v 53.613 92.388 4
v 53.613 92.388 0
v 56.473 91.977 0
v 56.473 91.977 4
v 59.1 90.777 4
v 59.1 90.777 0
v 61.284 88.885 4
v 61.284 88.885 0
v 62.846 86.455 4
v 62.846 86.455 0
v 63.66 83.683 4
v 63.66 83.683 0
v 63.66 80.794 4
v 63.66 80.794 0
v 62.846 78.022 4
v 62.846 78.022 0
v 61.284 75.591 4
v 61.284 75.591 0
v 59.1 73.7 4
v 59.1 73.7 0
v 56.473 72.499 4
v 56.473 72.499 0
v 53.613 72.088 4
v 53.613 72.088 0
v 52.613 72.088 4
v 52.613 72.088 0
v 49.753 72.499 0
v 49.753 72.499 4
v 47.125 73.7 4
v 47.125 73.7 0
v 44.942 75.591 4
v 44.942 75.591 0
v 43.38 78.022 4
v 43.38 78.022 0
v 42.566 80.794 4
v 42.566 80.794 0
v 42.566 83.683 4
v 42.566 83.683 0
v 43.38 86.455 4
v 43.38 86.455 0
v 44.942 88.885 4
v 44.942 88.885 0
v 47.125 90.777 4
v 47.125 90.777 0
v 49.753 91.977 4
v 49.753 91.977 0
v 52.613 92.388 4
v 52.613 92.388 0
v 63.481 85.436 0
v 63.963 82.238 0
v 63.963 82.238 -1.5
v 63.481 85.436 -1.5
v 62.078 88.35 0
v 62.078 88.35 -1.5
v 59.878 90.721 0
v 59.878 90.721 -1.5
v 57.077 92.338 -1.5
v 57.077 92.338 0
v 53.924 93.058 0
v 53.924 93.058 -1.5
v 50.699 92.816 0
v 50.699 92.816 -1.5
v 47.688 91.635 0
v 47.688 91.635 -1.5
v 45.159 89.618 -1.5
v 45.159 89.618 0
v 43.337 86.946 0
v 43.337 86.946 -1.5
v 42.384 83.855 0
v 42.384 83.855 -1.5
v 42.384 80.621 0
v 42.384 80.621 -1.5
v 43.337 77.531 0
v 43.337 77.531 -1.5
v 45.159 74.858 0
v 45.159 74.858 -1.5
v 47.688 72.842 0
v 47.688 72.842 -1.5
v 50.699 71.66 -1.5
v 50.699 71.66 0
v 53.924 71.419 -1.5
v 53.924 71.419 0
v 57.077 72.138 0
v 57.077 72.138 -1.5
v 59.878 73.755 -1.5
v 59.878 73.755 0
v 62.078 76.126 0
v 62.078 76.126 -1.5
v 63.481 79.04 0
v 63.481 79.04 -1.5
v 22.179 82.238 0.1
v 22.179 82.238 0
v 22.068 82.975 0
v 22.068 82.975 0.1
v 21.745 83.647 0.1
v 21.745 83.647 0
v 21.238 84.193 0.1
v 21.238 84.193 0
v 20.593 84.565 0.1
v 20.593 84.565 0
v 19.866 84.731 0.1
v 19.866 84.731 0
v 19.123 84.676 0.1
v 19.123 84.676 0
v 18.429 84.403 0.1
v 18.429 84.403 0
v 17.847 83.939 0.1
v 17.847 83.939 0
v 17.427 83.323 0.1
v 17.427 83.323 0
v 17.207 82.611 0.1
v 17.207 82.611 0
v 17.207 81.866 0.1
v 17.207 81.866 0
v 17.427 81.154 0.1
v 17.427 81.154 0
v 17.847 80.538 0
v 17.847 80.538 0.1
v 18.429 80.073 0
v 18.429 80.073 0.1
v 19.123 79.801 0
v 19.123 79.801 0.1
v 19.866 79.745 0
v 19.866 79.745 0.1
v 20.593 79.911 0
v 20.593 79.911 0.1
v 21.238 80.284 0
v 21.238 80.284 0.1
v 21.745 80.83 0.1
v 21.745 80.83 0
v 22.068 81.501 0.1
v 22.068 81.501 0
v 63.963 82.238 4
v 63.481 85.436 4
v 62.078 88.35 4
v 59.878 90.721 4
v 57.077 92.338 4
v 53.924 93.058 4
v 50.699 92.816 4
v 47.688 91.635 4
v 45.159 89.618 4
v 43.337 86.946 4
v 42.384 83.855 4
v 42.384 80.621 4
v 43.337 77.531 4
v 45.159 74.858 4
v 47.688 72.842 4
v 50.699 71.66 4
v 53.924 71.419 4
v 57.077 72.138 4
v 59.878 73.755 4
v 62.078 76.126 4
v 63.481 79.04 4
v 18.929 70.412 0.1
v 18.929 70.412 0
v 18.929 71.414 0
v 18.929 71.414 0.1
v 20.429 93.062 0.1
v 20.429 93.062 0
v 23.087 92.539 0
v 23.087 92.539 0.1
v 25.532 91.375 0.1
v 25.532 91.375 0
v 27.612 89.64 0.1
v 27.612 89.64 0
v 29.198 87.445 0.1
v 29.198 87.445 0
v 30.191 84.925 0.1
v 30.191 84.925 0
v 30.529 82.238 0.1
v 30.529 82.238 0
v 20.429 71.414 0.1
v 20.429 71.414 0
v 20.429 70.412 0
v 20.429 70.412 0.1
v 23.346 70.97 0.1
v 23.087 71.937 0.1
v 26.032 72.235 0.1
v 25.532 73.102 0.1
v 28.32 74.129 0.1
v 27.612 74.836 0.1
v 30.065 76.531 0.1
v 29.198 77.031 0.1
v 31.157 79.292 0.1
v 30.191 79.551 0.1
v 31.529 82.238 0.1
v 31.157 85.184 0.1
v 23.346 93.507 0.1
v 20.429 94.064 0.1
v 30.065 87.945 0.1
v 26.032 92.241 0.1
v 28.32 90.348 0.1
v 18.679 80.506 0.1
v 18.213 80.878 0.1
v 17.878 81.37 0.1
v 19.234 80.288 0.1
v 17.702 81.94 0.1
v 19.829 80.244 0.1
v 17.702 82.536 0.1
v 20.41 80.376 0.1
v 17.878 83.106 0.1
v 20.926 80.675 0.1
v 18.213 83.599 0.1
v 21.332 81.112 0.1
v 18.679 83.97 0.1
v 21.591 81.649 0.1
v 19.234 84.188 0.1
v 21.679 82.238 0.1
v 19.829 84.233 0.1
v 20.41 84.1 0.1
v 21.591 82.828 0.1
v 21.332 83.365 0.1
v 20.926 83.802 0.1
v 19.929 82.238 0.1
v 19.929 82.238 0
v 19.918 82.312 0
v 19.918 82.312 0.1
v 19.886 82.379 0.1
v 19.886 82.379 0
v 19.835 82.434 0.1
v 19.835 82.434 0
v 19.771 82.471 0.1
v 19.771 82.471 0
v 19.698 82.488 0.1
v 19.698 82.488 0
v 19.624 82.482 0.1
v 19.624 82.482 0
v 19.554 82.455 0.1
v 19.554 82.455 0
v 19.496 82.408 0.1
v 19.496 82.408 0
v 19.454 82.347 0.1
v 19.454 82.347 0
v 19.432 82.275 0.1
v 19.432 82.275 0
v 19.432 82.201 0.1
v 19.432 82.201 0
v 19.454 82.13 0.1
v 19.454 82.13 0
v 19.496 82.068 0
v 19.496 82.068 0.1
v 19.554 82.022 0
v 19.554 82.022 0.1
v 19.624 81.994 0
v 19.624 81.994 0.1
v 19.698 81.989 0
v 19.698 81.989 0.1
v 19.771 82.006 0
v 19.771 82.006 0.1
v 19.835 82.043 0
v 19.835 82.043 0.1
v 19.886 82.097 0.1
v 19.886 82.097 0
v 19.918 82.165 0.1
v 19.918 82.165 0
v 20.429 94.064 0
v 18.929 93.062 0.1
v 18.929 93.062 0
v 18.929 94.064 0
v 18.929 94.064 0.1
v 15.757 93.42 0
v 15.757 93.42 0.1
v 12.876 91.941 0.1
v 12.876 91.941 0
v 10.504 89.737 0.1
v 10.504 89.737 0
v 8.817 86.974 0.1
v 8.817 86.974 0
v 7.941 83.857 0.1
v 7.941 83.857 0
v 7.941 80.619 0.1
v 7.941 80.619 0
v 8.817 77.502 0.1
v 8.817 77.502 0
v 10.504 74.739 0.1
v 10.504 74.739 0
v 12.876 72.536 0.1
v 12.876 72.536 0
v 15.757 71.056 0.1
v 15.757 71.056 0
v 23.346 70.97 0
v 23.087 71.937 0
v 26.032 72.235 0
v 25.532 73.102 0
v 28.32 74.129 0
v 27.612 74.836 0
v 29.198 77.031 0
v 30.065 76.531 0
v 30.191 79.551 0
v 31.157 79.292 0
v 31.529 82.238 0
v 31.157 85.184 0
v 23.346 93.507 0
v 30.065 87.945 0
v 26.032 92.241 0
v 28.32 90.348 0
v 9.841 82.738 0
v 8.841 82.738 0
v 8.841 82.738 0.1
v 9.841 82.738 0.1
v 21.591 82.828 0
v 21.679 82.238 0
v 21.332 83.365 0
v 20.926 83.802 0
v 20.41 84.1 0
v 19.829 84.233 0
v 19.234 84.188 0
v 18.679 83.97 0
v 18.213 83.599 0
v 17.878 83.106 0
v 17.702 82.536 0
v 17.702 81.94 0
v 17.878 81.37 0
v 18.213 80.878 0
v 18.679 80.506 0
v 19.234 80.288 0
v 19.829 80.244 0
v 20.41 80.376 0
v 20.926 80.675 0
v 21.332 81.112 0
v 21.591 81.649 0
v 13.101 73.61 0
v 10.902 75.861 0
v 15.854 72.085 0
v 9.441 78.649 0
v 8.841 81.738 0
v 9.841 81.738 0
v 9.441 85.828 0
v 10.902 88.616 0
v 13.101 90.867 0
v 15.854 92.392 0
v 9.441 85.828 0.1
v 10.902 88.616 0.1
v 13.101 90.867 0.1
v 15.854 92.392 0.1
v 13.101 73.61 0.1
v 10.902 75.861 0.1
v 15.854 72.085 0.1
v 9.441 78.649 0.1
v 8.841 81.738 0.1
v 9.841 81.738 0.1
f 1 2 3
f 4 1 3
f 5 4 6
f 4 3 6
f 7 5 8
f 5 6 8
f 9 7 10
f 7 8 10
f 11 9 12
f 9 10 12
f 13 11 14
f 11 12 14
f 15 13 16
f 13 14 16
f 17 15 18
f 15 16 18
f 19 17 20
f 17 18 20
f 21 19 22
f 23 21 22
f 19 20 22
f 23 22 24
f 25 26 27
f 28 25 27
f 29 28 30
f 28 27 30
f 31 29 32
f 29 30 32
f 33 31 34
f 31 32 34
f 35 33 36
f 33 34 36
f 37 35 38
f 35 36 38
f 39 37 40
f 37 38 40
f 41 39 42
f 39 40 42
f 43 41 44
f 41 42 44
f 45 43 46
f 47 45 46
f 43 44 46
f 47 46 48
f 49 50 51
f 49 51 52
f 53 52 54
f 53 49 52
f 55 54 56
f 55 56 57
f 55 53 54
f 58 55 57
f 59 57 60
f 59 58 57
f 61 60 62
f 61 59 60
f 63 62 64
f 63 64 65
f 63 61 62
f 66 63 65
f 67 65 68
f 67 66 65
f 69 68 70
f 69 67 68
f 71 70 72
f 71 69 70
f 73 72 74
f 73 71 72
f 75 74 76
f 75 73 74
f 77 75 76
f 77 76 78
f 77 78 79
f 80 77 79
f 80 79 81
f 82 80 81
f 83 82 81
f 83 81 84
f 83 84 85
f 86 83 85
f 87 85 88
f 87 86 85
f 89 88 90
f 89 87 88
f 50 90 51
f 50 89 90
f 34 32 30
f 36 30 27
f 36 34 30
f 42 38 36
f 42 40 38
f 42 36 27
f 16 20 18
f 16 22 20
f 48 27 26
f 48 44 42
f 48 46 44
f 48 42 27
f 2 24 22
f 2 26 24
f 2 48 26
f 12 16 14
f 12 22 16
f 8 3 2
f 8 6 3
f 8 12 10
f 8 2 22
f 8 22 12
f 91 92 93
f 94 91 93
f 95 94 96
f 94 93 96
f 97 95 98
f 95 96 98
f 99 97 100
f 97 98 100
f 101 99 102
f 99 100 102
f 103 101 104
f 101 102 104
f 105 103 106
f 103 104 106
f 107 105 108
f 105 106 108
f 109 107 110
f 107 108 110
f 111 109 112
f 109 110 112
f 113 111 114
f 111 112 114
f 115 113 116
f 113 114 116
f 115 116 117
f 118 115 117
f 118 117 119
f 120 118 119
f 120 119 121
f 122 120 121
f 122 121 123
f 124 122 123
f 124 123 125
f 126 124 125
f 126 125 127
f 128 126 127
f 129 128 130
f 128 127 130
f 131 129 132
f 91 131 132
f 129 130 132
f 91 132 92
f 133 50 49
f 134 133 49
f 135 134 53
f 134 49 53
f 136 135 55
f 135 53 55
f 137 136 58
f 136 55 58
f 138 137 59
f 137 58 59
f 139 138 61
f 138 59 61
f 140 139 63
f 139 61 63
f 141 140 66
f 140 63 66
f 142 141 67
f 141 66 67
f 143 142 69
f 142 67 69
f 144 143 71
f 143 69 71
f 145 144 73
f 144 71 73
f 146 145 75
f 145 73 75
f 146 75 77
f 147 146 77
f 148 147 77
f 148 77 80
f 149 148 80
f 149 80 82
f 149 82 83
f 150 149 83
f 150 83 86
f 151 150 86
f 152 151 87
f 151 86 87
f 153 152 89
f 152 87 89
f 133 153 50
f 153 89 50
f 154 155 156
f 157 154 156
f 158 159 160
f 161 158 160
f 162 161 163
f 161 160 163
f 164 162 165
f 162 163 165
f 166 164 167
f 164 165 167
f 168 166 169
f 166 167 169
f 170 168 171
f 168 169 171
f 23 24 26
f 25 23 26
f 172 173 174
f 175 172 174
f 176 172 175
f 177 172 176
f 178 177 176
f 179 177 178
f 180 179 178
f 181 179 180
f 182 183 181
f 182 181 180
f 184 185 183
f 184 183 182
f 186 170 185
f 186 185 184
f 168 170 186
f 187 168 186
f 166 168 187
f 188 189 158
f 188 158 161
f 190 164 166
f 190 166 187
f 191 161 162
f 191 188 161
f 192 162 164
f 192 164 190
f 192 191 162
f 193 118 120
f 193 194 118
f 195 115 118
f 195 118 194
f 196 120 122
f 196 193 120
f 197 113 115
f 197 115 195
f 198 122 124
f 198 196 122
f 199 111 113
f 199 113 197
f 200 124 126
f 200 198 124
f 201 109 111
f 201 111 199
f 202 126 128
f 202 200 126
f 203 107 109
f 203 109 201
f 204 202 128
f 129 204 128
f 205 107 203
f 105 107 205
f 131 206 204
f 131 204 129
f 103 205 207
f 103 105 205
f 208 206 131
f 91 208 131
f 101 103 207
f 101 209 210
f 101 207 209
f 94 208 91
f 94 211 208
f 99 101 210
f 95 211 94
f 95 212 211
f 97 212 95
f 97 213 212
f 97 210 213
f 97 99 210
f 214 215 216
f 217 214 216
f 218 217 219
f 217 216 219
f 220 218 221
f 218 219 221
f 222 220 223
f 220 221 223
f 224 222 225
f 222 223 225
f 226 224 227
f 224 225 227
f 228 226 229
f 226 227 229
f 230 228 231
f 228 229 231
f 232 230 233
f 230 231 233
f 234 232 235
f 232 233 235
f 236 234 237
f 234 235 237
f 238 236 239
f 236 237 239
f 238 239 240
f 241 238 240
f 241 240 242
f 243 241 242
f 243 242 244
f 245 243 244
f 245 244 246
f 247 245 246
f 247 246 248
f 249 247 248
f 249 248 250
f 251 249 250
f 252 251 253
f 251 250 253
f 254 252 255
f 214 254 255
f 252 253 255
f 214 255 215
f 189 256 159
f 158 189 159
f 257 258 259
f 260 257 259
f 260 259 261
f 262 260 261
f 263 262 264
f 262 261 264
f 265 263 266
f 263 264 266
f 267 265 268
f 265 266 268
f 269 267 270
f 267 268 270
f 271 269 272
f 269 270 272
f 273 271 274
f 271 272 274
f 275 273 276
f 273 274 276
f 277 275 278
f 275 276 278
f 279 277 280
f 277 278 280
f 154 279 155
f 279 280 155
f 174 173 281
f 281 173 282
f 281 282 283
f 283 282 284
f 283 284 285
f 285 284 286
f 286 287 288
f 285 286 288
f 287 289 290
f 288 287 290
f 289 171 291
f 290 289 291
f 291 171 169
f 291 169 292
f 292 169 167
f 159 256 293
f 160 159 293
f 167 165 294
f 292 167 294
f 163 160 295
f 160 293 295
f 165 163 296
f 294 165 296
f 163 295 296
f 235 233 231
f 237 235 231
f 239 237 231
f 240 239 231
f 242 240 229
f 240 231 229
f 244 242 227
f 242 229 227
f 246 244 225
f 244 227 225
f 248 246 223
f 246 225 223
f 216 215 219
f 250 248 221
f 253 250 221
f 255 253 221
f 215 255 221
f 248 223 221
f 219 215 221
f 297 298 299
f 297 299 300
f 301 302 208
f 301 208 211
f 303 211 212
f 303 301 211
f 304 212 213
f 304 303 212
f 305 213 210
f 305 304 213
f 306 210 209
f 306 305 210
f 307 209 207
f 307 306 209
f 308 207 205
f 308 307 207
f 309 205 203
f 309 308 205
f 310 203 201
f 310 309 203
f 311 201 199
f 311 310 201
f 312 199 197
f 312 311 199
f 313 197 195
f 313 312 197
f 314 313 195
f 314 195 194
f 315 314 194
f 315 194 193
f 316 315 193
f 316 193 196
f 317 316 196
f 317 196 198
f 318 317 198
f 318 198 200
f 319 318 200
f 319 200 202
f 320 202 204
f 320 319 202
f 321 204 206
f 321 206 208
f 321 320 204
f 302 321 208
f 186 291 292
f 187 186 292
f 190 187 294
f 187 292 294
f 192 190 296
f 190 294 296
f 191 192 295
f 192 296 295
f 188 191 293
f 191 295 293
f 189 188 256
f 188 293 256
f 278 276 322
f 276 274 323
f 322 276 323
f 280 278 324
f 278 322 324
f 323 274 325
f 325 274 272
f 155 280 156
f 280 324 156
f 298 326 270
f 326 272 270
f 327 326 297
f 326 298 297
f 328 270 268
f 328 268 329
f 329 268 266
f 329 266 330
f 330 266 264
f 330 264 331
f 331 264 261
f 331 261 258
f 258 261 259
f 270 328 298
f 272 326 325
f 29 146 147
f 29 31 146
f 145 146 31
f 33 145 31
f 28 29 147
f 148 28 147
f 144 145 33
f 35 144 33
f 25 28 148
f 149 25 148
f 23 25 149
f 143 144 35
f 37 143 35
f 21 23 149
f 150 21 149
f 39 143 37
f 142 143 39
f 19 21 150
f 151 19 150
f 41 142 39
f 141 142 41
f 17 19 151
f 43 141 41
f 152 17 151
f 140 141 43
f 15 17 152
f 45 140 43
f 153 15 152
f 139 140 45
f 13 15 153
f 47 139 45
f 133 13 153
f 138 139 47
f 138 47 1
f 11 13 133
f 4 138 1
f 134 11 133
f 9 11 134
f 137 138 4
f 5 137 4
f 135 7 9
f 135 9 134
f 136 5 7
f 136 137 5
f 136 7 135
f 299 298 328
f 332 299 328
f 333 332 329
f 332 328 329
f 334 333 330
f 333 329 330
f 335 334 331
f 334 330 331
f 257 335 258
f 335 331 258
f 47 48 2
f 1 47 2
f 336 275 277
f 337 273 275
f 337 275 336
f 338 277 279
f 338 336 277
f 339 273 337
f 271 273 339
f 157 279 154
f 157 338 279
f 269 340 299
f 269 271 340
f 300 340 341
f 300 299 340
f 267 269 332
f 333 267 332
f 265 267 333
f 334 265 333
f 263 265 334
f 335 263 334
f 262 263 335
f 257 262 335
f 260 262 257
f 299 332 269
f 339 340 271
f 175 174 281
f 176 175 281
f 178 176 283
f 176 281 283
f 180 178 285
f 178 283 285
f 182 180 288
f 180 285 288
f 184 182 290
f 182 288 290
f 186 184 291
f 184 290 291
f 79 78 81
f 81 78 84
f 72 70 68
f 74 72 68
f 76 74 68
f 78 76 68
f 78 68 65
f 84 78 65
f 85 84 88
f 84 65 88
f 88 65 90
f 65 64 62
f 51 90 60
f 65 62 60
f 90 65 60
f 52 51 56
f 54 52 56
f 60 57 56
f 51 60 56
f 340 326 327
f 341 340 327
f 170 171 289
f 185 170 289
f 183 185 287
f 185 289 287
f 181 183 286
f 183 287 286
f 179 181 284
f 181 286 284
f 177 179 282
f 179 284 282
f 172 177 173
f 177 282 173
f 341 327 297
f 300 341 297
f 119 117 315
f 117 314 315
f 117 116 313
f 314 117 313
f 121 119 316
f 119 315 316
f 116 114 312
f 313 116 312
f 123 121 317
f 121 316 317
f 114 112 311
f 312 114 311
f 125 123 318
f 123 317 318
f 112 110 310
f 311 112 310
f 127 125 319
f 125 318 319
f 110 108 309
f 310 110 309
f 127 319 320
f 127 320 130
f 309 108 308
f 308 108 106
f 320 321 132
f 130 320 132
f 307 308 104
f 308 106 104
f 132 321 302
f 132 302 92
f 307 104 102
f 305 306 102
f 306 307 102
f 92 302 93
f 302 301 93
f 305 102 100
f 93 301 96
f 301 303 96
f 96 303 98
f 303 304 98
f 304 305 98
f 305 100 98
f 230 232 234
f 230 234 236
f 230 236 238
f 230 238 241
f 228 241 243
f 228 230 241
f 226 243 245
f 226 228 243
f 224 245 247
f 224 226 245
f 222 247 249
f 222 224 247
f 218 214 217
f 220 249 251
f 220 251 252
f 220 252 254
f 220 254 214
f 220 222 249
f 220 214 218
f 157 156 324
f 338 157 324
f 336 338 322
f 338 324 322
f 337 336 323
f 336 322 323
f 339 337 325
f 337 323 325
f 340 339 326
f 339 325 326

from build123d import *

# Parameters (mm, degrees)
F0_R     = 2.5
F0_R_2   = 2
F1_DEPTH = 0.1
F0_W     = 1
F0_H     = 1
F2_DEPTH = 0.1
F0_R_3   = 0.25
F3_DEPTH = 0.1
F0_R_4   = 10.85
F4_DEPTH = 1.5
F5_DEPTH = 4


with BuildPart() as f1:
    # F0 (on Top) → F1 (new body)
    with BuildSketch(Plane.XY):
        with Locations((19.679473713, 82.238227129)):
            Circle(F0_R)
        with Locations((19.679473713, 82.238227129)):
            Circle(F0_R_2, mode=Mode.SUBTRACT)
    extrude(amount=F1_DEPTH)


with BuildPart() as f2:
    # F0 (on Top) → F2 (new body)
    with BuildSketch(Plane.XY):
        with BuildLine():
            ThreePointArc((8.8410005733, 81.738227129), (8.829473713, 82.238227129), (8.8410005733, 82.738227129))
            ThreePointArc((8.8410005733, 82.738227129), (11.9193406213, 89.8212894654), (18.929473713, 93.0622744312))
            Line((18.929473713, 93.0622744312), (18.929473713, 94.0644691356))
            ThreePointArc((18.929473713, 94.0644691356), (7.829473713, 82.238227129), (18.929473713, 70.4119851223))
            Line((18.929473713, 70.4119851223), (18.929473713, 71.4141798268))
            ThreePointArc((18.929473713, 71.4141798268), (11.9193406213, 74.6551647926), (8.8410005733, 81.738227129))
        make_face()
        with Locations((9.3410005733, 82.238227129)):
            Rectangle(F0_W, F0_H)
        with BuildLine():
            Line((8.8410005733, 81.738227129), (8.8410005733, 82.738227129))
            ThreePointArc((8.8410005733, 82.738227129), (8.829473713, 82.238227129), (8.8410005733, 81.738227129))
        make_face()
    extrude(amount=F2_DEPTH)


with BuildPart() as f2b:
    # F0 (on Top) → F2, piece 2 (new body)
    with BuildSketch(Plane.XY):
        with BuildLine():
            Line((20.429473713, 94.0644691356), (20.429473713, 93.0622744312))
            ThreePointArc((20.429473713, 93.0622744312), (27.6123168351, 89.6404227492), (30.529473713, 82.238227129))
            ThreePointArc((30.529473713, 82.238227129), (27.6123168351, 74.8360315088), (20.429473713, 71.4141798268))
            Line((20.429473713, 71.4141798268), (20.429473713, 70.4119851223))
            ThreePointArc((20.429473713, 70.4119851223), (28.3197862074, 74.1285107344), (31.529473713, 82.238227129))
            ThreePointArc((31.529473713, 82.238227129), (28.3197862074, 90.3479435235), (20.429473713, 94.0644691356))
        make_face()
    extrude(amount=F2_DEPTH)


with BuildPart() as f3:
    # F0 (on Top) → F3 (new body)
    with BuildSketch(Plane.XY):
        with Locations((19.679473713, 82.238227129)):
            Circle(F0_R_3)
    extrude(amount=F3_DEPTH)


with BuildPart() as f4:
    # F0 (on Top) → F4 (new body)
    with BuildSketch(Plane.XY):
        with Locations((53.1129379869, 82.238227129)):
            Circle(F0_R_4)
        with BuildLine():
            Line((53.6129379869, 72.088227129), (52.6129379869, 72.088227129))
            ThreePointArc((52.6129379869, 72.088227129), (42.4629379869, 82.238227129), (52.6129379869, 92.388227129))
            Line((52.6129379869, 92.388227129), (53.6129379869, 92.388227129))
            ThreePointArc((53.6129379869, 92.388227129), (63.7629379869, 82.238227129), (53.6129379869, 72.088227129))
        make_face(mode=Mode.SUBTRACT)
        with BuildLine():
            ThreePointArc((52.6129379869, 92.388227129), (42.4629379869, 82.238227129), (52.6129379869, 72.088227129))
            Line((52.6129379869, 72.088227129), (53.6129379869, 72.088227129))
            ThreePointArc((53.6129379869, 72.088227129), (63.7629379869, 82.238227129), (53.6129379869, 92.388227129))
            Line((53.6129379869, 92.388227129), (52.6129379869, 92.388227129))
        make_face()
    extrude(amount=-F4_DEPTH)

    # F0 (on Top) → F5 (join)
    with BuildSketch(Plane.XY):
        with Locations((53.1129379869, 82.238227129)):
            Circle(F0_R_4)
        with BuildLine():
            Line((53.6129379869, 72.088227129), (52.6129379869, 72.088227129))
            ThreePointArc((52.6129379869, 72.088227129), (42.4629379869, 82.238227129), (52.6129379869, 92.388227129))
            Line((52.6129379869, 92.388227129), (53.6129379869, 92.388227129))
            ThreePointArc((53.6129379869, 92.388227129), (63.7629379869, 82.238227129), (53.6129379869, 72.088227129))
        make_face(mode=Mode.SUBTRACT)
    extrude(amount=F5_DEPTH)


solid = Compound([f1.part, f2.part, f2b.part, f3.part, f4.part])
